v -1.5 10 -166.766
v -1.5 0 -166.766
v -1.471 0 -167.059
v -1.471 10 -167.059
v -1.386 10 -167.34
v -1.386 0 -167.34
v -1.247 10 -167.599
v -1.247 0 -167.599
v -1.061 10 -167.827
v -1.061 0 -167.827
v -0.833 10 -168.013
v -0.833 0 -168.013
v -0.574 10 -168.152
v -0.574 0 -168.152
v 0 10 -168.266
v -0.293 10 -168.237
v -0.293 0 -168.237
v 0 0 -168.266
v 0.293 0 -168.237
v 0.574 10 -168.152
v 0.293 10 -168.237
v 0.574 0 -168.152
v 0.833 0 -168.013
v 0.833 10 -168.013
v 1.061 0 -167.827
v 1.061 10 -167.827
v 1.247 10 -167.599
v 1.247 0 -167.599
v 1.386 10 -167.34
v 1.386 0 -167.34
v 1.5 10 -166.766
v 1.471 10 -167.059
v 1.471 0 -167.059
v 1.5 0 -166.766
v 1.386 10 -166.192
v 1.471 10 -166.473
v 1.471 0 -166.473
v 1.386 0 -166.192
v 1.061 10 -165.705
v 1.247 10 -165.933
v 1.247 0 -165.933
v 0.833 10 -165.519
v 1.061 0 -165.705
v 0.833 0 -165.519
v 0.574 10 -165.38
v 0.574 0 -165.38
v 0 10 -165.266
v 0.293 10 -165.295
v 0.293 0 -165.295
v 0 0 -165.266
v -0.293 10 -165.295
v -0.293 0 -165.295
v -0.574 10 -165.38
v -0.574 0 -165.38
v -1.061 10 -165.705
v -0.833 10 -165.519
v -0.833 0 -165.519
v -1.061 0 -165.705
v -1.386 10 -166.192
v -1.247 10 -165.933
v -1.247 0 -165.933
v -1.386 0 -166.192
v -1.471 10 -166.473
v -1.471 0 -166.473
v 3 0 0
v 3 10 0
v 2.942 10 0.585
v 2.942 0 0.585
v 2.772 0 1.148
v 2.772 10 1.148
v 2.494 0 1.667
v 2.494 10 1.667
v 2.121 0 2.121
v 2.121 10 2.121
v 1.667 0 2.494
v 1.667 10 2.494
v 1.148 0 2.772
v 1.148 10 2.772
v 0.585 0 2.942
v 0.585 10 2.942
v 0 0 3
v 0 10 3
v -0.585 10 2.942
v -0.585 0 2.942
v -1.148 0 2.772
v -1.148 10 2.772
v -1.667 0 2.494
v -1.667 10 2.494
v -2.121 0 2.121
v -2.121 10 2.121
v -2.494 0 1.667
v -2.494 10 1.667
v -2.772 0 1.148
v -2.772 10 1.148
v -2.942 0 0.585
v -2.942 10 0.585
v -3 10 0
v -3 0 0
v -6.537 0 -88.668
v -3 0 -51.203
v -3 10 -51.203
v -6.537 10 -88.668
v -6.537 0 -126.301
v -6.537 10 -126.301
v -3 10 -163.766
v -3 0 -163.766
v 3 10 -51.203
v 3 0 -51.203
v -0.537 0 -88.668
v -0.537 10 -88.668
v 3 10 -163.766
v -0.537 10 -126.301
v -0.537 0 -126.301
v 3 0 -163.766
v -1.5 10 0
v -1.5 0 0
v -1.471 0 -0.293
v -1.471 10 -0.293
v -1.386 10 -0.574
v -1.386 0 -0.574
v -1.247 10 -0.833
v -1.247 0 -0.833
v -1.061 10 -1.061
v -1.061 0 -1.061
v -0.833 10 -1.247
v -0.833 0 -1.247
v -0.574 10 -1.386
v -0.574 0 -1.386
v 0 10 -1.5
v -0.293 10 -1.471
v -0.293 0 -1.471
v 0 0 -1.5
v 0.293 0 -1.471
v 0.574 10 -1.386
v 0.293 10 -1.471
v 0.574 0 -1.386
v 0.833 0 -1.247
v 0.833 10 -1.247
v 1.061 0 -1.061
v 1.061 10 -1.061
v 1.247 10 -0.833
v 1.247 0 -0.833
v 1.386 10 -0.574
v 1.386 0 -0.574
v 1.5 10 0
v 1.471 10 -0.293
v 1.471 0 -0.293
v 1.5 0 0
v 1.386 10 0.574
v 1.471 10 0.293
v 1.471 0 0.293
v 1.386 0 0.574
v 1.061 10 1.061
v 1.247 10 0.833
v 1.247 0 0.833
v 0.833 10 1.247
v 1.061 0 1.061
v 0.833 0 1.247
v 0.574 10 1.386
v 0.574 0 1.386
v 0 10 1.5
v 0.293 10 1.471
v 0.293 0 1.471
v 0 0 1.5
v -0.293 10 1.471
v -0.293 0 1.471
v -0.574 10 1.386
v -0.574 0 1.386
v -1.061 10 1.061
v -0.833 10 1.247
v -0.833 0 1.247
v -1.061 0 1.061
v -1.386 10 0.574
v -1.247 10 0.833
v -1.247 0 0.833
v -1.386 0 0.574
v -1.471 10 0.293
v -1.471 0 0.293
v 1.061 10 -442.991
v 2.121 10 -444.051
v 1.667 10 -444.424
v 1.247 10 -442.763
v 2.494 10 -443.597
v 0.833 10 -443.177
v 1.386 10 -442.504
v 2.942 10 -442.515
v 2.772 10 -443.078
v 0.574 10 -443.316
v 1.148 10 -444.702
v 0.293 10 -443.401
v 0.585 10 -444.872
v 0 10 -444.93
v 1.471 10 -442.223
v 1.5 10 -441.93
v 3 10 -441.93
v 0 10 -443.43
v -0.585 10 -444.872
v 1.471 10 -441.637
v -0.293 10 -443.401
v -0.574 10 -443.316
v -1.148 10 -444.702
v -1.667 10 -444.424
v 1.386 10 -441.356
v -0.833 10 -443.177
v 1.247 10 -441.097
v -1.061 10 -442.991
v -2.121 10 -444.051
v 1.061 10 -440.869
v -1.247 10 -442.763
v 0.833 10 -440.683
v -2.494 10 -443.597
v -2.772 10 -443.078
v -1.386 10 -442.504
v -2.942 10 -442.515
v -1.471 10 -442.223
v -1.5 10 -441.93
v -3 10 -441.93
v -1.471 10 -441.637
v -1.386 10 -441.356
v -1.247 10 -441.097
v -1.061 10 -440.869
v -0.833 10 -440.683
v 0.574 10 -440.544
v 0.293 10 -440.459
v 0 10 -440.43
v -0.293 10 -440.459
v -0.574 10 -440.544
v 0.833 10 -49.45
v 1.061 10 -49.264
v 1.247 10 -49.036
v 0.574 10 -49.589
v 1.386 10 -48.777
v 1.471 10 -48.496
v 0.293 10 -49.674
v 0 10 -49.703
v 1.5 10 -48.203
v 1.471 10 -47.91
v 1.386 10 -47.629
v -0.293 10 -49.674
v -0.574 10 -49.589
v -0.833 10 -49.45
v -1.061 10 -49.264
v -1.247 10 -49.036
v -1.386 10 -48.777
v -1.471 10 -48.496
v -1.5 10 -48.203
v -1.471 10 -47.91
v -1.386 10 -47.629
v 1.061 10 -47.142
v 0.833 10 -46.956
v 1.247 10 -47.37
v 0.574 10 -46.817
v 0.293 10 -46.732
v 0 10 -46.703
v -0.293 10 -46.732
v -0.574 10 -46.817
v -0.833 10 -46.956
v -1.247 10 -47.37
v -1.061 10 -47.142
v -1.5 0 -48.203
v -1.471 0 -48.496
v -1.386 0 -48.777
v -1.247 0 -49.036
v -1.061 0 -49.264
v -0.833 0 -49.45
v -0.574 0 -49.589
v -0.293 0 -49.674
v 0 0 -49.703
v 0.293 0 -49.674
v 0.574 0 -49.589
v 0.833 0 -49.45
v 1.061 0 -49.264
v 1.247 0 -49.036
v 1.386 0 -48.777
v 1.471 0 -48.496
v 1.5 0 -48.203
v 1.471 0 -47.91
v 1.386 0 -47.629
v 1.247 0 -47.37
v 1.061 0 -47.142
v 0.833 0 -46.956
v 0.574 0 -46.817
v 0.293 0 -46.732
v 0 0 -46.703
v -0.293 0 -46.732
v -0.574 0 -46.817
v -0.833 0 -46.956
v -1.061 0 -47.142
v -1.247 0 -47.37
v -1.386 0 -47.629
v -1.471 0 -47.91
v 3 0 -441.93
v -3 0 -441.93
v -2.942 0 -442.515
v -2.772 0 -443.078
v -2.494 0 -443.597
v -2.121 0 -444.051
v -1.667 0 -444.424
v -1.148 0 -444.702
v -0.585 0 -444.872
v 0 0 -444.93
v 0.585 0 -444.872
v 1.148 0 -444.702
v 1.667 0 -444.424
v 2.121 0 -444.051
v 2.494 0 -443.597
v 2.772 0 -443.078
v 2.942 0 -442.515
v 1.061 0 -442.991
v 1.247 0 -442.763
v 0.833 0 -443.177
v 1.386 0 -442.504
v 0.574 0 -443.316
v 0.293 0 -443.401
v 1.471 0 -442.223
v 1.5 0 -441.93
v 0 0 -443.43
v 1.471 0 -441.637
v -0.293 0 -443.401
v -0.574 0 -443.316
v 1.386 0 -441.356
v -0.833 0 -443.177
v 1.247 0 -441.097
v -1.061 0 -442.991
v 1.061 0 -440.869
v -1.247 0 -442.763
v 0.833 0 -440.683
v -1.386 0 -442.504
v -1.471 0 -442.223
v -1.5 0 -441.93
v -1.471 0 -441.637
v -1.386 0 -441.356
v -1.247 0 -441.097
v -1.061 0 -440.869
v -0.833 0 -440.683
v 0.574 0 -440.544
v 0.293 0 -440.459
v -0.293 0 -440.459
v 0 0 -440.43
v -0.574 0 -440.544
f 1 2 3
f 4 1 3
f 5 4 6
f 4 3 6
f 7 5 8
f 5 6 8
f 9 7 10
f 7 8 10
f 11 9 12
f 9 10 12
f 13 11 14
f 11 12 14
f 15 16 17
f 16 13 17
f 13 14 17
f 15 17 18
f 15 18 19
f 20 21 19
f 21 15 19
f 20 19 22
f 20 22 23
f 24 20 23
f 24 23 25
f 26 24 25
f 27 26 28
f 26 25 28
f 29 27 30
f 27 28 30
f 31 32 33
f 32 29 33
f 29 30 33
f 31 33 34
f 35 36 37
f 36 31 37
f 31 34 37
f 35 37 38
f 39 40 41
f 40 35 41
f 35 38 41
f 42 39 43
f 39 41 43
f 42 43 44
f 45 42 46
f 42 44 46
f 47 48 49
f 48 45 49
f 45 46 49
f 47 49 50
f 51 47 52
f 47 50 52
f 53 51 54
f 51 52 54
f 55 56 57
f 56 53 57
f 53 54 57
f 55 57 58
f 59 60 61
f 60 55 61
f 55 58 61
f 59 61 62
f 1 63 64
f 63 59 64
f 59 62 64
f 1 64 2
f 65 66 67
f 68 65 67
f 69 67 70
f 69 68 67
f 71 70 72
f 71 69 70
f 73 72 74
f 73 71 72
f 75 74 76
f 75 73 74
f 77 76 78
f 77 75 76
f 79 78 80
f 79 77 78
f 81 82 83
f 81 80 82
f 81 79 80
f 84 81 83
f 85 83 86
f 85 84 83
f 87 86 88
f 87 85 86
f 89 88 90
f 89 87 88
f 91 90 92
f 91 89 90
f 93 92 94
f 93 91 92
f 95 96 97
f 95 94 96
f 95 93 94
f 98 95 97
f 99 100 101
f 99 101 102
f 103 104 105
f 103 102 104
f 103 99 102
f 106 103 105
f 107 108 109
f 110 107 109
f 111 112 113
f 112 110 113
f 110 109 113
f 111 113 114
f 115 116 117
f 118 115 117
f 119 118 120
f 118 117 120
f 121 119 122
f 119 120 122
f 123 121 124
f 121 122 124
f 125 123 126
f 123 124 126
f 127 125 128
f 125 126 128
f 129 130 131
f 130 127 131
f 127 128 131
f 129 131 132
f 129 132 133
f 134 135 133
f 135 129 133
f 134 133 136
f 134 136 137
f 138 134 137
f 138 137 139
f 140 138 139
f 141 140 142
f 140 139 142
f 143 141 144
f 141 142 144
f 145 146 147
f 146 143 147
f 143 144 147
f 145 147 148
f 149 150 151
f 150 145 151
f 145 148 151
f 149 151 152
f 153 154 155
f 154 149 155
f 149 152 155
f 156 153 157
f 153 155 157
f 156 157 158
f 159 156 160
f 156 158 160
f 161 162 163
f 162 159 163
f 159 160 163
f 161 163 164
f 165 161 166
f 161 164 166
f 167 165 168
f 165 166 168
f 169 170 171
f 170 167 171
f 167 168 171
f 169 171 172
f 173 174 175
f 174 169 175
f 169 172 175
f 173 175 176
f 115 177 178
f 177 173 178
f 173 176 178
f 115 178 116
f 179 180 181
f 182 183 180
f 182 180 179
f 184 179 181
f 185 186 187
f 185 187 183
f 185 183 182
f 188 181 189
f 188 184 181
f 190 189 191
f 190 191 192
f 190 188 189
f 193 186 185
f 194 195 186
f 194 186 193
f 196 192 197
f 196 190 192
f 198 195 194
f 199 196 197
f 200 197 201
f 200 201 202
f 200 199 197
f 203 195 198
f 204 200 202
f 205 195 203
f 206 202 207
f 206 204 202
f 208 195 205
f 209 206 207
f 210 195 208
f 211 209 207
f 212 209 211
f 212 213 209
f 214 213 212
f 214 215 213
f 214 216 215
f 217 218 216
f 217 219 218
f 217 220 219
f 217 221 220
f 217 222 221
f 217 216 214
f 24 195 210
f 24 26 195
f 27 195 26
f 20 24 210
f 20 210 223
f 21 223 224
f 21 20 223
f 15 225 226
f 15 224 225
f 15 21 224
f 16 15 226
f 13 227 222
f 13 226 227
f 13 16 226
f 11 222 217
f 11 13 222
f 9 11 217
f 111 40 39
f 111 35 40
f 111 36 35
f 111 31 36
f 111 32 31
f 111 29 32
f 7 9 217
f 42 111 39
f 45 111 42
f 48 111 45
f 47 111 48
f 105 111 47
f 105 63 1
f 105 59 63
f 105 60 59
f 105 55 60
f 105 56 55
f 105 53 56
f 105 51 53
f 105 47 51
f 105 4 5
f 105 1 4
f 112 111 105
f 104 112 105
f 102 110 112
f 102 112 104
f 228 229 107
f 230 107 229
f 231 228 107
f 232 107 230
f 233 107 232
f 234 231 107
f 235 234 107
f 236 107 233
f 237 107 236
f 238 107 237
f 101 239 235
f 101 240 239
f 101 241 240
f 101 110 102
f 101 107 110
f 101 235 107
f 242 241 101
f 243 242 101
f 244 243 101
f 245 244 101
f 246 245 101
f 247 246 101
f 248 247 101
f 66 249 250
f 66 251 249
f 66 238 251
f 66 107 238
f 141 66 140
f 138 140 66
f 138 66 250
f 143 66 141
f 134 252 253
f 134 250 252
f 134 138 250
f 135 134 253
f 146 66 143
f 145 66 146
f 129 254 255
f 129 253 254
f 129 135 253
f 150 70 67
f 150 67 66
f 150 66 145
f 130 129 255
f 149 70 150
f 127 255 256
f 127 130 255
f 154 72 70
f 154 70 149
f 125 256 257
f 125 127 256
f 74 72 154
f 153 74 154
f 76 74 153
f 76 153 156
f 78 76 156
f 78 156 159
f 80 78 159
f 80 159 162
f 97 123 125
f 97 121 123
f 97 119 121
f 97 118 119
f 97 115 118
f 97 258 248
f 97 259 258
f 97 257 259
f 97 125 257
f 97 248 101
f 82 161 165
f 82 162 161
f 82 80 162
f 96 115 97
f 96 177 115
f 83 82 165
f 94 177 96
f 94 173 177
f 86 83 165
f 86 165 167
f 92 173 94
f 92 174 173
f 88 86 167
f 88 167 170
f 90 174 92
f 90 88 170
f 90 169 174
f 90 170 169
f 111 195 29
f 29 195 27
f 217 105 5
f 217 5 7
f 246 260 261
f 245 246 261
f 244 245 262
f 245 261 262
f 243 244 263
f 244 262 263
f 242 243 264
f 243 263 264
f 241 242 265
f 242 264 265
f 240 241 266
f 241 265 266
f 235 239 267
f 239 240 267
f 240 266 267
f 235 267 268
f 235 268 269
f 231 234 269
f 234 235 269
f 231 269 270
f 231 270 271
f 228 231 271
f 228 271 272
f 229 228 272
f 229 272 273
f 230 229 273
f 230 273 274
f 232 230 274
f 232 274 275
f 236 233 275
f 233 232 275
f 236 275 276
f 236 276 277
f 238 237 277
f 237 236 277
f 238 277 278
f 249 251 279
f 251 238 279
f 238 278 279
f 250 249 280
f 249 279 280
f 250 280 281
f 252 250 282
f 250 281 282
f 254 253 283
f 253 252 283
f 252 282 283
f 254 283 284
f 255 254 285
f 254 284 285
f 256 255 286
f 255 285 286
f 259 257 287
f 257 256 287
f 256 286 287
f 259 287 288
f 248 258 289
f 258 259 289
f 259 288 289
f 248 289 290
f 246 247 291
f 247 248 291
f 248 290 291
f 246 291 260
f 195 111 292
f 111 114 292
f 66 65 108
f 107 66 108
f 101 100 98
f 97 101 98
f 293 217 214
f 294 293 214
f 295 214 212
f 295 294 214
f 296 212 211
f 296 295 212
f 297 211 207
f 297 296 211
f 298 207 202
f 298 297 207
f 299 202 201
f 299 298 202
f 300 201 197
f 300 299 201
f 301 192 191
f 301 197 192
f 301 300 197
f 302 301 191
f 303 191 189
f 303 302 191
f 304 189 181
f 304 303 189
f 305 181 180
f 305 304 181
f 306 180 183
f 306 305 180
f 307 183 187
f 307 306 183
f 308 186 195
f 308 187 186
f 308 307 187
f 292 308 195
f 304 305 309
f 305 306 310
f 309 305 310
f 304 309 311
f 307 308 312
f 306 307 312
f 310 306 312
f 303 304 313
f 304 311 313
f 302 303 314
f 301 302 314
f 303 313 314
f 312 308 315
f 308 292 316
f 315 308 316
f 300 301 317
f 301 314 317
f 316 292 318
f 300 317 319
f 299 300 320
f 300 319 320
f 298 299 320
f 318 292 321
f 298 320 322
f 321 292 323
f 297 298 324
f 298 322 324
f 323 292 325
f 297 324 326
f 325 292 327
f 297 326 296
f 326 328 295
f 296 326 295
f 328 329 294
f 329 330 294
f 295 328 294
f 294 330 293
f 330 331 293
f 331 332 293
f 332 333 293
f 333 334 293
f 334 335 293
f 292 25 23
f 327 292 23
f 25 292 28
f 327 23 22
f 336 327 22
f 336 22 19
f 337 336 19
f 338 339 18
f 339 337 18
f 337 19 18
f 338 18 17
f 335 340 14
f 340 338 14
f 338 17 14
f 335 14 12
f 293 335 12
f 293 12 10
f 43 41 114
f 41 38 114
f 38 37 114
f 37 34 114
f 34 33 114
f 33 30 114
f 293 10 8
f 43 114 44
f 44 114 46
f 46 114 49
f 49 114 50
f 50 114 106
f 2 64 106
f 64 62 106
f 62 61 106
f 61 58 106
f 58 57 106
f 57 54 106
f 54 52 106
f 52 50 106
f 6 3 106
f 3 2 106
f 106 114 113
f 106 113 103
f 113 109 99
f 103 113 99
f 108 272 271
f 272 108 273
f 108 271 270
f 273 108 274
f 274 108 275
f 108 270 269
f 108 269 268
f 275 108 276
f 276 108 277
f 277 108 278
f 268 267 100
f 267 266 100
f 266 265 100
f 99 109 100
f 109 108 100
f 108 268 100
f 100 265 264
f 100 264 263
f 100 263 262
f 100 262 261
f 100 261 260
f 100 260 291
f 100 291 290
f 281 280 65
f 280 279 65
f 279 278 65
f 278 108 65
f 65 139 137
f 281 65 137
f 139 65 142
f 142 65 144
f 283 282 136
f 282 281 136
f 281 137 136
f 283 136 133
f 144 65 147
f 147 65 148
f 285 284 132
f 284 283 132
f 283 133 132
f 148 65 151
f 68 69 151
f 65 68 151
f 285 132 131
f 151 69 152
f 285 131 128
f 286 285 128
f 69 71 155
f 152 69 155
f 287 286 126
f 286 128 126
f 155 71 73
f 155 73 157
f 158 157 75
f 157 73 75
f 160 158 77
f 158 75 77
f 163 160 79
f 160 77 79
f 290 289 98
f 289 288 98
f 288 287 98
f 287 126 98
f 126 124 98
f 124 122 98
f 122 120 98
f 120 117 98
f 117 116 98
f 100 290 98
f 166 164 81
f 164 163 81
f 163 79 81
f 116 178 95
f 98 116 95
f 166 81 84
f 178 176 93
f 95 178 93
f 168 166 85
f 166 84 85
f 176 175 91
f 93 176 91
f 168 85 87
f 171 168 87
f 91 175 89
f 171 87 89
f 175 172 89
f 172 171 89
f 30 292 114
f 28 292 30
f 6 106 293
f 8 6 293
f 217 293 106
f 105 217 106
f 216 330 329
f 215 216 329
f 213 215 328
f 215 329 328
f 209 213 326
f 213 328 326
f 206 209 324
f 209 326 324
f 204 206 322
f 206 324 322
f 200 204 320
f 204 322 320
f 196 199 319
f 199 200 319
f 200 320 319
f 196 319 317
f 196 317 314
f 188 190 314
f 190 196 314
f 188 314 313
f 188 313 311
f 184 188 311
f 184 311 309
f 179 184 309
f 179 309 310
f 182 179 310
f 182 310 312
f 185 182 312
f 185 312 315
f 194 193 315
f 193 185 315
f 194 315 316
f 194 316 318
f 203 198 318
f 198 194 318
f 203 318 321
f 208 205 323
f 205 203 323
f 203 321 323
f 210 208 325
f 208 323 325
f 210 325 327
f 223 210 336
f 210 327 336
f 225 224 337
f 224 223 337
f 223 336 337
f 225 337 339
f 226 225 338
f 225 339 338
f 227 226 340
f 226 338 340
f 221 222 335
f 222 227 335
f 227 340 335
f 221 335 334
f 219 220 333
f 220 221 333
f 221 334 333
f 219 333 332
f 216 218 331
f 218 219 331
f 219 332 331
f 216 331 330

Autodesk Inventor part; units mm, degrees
ref_plane "YZ Plane" through (0, 0, 0) normal (1, 0, 0) x (0, 1, 0)
ref_plane "XZ Plane" through (0, 0, 0) normal (0, 1, 0) x (-1, 0, 0)
ref_plane "XY Plane" through (0, 0, 0) normal (0, 0, 1) x (1, 0, 0)
sketch "Sketch1" plane through (0, 0, 0) normal (0, 1, 0) x (-1, 0, 0)
  line L0 (0, 0) -> (0, -441.93) construction
  line L1 (-3, 0) -> (-3, -441.93)
  line L2 (3, -441.93) -> (3, 0)
  arc A0 (3, 0) -> (-3, 0) centre (0, 0) ccw
  arc A1 (-3, -441.93) -> (3, -441.93) centre (0, -441.93) ccw
  circle A2 centre (0, 0) radius 1.5
  circle A3 centre (0, -441.93) radius 1.5
  circle A4 centre (0, -48.203) radius 1.5
  circle A5 centre (0, -166.766) radius 1.5
  arc A6 (-3, -163.766) -> (-3, -51.203) centre (-399.0207, -107.4845) ccw
  arc A7 (3, -163.766) -> (3, -51.203) centre (-393.0207, -107.4845) ccw
  point P0 (0, -220.965)
  dimension "d0" = 6
  dimension "d1" = 441.93
  dimension "d2" = 3
  dimension "d3" = 3
  dimension "d20" = 3
  dimension "d21" = 48.203
  dimension "d22" = 3
  dimension "d23" = 166.766
  dimension "d24" = 400
  dimension "d25" = 400
  dimension "d26" = 3
  dimension "d28" = 3
extrude "Extrusion1" add sketch "Sketch1" along normal blind 10 contours A0 L2 A1 L1 A6 | A7 L2
sketch "Sketch2" plane through (0, 10, 0) normal (0, 1, 0) x (1, 0, 0)
  line L0 (3, 0) -> (3, 51.203) projected
  arc A0 (3, 163.766) -> (3, 51.203) centre (399.0207, 107.4845) ccw projected
  line L1 (3, 163.766) -> (3, 441.93) projected
  arc A1 (3, 441.93) -> (-3, 441.93) centre (0, 441.93) ccw projected
  line L2 (-3, 441.93) -> (-3, 163.766) projected
  arc A2 (-3, 163.766) -> (-3, 51.203) centre (393.0207, 107.4845) ccw projected
  line L3 (-3, 51.203) -> (-3, 0) projected
  arc A3 (-3, 0) -> (3, 0) centre (0, 0) ccw projected
  circle A4 centre (0, 0) radius 1.5 projected
  circle A5 centre (0, 441.93) radius 1.5 projected
  circle A6 centre (0, 166.766) radius 1.5 projected
  circle A7 centre (0, 48.203) radius 1.5 projected
  line L4 (-3, 258.3394) -> (0, 251.9059)
  line L5 (0, 251.9059) -> (3, 258.3394)
  dimension "d29" = 25
  dimension "d30" = 25
extrude "Extrusion2" [suppressed]
